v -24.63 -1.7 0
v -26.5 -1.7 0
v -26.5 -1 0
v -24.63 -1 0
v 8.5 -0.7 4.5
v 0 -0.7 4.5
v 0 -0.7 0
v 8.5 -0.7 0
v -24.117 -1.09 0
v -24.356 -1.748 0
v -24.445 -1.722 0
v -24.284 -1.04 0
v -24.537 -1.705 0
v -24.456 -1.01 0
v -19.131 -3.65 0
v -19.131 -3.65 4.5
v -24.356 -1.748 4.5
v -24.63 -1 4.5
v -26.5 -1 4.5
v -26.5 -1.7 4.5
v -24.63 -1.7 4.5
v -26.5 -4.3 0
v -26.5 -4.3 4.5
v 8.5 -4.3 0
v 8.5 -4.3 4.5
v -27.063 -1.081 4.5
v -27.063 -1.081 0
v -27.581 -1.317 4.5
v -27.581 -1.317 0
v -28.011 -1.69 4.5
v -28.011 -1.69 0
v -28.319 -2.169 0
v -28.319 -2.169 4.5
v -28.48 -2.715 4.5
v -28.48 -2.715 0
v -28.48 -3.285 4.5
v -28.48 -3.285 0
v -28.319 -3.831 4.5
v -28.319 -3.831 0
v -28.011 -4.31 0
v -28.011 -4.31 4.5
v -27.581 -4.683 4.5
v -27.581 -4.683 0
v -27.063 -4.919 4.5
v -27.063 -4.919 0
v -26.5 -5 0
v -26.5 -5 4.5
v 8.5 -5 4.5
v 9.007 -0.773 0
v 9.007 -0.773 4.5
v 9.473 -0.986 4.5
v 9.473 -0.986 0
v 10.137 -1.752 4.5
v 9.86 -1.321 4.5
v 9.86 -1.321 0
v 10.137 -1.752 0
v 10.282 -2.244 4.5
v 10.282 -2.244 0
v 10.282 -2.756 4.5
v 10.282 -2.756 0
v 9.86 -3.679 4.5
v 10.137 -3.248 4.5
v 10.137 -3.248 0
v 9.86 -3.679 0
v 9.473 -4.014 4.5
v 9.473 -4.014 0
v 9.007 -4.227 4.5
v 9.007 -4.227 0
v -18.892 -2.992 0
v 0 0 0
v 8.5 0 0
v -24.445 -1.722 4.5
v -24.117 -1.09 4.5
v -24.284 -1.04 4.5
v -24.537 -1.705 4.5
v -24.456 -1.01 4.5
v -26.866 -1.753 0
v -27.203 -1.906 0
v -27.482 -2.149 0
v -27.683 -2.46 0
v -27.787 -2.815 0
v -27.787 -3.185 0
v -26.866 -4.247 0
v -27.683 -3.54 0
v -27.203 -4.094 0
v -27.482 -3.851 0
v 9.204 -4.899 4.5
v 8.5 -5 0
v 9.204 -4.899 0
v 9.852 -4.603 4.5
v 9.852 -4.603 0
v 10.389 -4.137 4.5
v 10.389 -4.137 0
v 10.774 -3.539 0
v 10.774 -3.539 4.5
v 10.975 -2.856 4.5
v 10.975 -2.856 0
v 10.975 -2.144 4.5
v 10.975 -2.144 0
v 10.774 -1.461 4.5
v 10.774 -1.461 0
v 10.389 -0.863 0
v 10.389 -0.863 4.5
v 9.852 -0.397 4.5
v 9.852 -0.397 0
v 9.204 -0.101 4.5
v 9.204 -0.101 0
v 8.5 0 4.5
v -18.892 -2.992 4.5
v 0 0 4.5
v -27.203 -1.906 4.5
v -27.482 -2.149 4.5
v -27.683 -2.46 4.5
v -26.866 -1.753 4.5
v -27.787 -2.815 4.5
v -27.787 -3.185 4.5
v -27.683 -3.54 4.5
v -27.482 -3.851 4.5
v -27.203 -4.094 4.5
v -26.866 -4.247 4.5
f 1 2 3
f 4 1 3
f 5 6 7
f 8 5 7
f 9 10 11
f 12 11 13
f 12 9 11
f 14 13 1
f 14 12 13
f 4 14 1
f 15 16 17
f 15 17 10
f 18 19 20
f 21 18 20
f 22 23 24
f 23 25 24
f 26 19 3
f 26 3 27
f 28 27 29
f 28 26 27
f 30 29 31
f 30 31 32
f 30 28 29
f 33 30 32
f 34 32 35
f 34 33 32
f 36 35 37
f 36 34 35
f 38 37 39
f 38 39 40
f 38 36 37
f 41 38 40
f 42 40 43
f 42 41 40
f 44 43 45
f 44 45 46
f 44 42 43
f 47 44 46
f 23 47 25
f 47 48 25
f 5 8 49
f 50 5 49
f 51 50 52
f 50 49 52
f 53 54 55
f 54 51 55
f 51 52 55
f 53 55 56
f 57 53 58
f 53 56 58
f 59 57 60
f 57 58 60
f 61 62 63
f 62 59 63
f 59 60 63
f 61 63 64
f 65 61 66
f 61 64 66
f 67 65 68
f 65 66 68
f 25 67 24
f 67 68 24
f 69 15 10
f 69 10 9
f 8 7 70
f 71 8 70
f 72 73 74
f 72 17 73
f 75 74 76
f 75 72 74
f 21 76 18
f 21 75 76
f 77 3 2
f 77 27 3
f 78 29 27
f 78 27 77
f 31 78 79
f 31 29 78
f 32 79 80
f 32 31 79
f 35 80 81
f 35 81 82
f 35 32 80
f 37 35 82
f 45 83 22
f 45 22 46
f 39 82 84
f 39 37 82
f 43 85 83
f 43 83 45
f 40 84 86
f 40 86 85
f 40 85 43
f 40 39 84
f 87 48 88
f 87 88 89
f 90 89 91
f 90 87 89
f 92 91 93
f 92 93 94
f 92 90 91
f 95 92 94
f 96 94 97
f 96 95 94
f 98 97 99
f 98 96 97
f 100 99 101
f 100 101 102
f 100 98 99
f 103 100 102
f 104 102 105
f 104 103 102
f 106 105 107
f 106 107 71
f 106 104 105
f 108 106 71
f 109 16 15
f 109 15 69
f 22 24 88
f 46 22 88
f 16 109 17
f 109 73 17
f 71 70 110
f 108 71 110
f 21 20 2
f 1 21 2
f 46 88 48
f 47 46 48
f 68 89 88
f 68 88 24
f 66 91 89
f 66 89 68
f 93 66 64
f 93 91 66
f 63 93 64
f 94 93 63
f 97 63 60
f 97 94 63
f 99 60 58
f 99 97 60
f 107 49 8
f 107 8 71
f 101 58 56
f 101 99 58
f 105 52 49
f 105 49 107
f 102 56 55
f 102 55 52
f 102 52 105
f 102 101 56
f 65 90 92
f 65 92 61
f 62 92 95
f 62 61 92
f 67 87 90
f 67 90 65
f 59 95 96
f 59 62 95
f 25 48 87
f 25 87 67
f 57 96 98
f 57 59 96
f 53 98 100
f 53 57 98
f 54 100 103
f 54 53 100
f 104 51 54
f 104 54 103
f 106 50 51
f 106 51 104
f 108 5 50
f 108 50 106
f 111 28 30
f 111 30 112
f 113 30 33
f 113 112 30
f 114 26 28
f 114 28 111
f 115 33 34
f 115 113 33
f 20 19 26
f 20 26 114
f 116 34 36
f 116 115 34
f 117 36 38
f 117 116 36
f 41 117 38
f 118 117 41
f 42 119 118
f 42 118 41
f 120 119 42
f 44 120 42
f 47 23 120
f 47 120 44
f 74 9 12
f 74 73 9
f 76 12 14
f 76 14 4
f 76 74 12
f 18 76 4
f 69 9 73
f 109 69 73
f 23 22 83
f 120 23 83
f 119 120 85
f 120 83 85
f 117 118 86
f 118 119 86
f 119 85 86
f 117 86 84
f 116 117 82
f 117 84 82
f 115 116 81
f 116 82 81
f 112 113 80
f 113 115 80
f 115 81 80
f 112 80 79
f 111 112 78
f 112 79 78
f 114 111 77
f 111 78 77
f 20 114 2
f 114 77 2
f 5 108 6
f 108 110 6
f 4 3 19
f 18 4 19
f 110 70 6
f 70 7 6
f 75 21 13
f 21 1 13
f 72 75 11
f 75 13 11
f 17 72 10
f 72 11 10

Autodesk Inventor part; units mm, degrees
ref_plane "YZ Plane" through (0, 0, 0) normal (1, 0, 0) x (0, 1, 0)
ref_plane "XZ Plane" through (0, 0, 0) normal (0, 1, 0) x (-1, 0, 0)
ref_plane "XY Plane" through (0, 0, 0) normal (0, 0, 1) x (1, 0, 0)
sketch "Sketch1" plane through (0, 0, 0) normal (0, 0, 1) x (1, 0, 0)
  line L0 (-26.5, -5) -> (8.5, -5)
  arc A0 (8.5, -5) -> (8.5, 0) centre (8.5, -2.5) ccw
  line L1 (8.5, 0) -> (0, 0)
  arc A1 (-26.5, -1) -> (-26.5, -5) centre (-26.5, -3) ccw
  line L2 (-26.5, -1) -> (-24.63, -1)
  line L3 (-24.117, -1.0905) -> (-18.8919, -2.9922)
  arc A2 (-24.117, -1.0905) -> (-24.63, -1) centre (-24.63, -2.5) ccw
  line L4 (-18.8919, -2.9922) -> (-19.1314, -3.65) construction
  dimension "d0" = 35
  dimension "d1" = 2.5
  dimension "d2" = 8.5
  dimension "d3" = 1.5
  dimension "d5" = 20
  dimension "d6" = 1.87
  dimension "d7" = 2
  dimension "d8" = 0.7
  dimension "d9" = 1.35
sketch "Sketch2" plane through (0, 0, 0) normal (1, 0, 0) x (0, 1, 0)
  line L0 (0, 0) -> (-0.7, 0)
  line L1 (-0.7, 0) -> (-0.7, 4.5)
  line L2 (-0.7, 4.5) -> (0, 4.5)
  line L3 (0, 4.5) -> (0, 0)
  dimension "d10" = 0.7
  dimension "d11" = 4.5
sweep "Sweep1" add profiles "Sketch2" path "Sketch1"
properties part number "PP-13" material "Steel"
